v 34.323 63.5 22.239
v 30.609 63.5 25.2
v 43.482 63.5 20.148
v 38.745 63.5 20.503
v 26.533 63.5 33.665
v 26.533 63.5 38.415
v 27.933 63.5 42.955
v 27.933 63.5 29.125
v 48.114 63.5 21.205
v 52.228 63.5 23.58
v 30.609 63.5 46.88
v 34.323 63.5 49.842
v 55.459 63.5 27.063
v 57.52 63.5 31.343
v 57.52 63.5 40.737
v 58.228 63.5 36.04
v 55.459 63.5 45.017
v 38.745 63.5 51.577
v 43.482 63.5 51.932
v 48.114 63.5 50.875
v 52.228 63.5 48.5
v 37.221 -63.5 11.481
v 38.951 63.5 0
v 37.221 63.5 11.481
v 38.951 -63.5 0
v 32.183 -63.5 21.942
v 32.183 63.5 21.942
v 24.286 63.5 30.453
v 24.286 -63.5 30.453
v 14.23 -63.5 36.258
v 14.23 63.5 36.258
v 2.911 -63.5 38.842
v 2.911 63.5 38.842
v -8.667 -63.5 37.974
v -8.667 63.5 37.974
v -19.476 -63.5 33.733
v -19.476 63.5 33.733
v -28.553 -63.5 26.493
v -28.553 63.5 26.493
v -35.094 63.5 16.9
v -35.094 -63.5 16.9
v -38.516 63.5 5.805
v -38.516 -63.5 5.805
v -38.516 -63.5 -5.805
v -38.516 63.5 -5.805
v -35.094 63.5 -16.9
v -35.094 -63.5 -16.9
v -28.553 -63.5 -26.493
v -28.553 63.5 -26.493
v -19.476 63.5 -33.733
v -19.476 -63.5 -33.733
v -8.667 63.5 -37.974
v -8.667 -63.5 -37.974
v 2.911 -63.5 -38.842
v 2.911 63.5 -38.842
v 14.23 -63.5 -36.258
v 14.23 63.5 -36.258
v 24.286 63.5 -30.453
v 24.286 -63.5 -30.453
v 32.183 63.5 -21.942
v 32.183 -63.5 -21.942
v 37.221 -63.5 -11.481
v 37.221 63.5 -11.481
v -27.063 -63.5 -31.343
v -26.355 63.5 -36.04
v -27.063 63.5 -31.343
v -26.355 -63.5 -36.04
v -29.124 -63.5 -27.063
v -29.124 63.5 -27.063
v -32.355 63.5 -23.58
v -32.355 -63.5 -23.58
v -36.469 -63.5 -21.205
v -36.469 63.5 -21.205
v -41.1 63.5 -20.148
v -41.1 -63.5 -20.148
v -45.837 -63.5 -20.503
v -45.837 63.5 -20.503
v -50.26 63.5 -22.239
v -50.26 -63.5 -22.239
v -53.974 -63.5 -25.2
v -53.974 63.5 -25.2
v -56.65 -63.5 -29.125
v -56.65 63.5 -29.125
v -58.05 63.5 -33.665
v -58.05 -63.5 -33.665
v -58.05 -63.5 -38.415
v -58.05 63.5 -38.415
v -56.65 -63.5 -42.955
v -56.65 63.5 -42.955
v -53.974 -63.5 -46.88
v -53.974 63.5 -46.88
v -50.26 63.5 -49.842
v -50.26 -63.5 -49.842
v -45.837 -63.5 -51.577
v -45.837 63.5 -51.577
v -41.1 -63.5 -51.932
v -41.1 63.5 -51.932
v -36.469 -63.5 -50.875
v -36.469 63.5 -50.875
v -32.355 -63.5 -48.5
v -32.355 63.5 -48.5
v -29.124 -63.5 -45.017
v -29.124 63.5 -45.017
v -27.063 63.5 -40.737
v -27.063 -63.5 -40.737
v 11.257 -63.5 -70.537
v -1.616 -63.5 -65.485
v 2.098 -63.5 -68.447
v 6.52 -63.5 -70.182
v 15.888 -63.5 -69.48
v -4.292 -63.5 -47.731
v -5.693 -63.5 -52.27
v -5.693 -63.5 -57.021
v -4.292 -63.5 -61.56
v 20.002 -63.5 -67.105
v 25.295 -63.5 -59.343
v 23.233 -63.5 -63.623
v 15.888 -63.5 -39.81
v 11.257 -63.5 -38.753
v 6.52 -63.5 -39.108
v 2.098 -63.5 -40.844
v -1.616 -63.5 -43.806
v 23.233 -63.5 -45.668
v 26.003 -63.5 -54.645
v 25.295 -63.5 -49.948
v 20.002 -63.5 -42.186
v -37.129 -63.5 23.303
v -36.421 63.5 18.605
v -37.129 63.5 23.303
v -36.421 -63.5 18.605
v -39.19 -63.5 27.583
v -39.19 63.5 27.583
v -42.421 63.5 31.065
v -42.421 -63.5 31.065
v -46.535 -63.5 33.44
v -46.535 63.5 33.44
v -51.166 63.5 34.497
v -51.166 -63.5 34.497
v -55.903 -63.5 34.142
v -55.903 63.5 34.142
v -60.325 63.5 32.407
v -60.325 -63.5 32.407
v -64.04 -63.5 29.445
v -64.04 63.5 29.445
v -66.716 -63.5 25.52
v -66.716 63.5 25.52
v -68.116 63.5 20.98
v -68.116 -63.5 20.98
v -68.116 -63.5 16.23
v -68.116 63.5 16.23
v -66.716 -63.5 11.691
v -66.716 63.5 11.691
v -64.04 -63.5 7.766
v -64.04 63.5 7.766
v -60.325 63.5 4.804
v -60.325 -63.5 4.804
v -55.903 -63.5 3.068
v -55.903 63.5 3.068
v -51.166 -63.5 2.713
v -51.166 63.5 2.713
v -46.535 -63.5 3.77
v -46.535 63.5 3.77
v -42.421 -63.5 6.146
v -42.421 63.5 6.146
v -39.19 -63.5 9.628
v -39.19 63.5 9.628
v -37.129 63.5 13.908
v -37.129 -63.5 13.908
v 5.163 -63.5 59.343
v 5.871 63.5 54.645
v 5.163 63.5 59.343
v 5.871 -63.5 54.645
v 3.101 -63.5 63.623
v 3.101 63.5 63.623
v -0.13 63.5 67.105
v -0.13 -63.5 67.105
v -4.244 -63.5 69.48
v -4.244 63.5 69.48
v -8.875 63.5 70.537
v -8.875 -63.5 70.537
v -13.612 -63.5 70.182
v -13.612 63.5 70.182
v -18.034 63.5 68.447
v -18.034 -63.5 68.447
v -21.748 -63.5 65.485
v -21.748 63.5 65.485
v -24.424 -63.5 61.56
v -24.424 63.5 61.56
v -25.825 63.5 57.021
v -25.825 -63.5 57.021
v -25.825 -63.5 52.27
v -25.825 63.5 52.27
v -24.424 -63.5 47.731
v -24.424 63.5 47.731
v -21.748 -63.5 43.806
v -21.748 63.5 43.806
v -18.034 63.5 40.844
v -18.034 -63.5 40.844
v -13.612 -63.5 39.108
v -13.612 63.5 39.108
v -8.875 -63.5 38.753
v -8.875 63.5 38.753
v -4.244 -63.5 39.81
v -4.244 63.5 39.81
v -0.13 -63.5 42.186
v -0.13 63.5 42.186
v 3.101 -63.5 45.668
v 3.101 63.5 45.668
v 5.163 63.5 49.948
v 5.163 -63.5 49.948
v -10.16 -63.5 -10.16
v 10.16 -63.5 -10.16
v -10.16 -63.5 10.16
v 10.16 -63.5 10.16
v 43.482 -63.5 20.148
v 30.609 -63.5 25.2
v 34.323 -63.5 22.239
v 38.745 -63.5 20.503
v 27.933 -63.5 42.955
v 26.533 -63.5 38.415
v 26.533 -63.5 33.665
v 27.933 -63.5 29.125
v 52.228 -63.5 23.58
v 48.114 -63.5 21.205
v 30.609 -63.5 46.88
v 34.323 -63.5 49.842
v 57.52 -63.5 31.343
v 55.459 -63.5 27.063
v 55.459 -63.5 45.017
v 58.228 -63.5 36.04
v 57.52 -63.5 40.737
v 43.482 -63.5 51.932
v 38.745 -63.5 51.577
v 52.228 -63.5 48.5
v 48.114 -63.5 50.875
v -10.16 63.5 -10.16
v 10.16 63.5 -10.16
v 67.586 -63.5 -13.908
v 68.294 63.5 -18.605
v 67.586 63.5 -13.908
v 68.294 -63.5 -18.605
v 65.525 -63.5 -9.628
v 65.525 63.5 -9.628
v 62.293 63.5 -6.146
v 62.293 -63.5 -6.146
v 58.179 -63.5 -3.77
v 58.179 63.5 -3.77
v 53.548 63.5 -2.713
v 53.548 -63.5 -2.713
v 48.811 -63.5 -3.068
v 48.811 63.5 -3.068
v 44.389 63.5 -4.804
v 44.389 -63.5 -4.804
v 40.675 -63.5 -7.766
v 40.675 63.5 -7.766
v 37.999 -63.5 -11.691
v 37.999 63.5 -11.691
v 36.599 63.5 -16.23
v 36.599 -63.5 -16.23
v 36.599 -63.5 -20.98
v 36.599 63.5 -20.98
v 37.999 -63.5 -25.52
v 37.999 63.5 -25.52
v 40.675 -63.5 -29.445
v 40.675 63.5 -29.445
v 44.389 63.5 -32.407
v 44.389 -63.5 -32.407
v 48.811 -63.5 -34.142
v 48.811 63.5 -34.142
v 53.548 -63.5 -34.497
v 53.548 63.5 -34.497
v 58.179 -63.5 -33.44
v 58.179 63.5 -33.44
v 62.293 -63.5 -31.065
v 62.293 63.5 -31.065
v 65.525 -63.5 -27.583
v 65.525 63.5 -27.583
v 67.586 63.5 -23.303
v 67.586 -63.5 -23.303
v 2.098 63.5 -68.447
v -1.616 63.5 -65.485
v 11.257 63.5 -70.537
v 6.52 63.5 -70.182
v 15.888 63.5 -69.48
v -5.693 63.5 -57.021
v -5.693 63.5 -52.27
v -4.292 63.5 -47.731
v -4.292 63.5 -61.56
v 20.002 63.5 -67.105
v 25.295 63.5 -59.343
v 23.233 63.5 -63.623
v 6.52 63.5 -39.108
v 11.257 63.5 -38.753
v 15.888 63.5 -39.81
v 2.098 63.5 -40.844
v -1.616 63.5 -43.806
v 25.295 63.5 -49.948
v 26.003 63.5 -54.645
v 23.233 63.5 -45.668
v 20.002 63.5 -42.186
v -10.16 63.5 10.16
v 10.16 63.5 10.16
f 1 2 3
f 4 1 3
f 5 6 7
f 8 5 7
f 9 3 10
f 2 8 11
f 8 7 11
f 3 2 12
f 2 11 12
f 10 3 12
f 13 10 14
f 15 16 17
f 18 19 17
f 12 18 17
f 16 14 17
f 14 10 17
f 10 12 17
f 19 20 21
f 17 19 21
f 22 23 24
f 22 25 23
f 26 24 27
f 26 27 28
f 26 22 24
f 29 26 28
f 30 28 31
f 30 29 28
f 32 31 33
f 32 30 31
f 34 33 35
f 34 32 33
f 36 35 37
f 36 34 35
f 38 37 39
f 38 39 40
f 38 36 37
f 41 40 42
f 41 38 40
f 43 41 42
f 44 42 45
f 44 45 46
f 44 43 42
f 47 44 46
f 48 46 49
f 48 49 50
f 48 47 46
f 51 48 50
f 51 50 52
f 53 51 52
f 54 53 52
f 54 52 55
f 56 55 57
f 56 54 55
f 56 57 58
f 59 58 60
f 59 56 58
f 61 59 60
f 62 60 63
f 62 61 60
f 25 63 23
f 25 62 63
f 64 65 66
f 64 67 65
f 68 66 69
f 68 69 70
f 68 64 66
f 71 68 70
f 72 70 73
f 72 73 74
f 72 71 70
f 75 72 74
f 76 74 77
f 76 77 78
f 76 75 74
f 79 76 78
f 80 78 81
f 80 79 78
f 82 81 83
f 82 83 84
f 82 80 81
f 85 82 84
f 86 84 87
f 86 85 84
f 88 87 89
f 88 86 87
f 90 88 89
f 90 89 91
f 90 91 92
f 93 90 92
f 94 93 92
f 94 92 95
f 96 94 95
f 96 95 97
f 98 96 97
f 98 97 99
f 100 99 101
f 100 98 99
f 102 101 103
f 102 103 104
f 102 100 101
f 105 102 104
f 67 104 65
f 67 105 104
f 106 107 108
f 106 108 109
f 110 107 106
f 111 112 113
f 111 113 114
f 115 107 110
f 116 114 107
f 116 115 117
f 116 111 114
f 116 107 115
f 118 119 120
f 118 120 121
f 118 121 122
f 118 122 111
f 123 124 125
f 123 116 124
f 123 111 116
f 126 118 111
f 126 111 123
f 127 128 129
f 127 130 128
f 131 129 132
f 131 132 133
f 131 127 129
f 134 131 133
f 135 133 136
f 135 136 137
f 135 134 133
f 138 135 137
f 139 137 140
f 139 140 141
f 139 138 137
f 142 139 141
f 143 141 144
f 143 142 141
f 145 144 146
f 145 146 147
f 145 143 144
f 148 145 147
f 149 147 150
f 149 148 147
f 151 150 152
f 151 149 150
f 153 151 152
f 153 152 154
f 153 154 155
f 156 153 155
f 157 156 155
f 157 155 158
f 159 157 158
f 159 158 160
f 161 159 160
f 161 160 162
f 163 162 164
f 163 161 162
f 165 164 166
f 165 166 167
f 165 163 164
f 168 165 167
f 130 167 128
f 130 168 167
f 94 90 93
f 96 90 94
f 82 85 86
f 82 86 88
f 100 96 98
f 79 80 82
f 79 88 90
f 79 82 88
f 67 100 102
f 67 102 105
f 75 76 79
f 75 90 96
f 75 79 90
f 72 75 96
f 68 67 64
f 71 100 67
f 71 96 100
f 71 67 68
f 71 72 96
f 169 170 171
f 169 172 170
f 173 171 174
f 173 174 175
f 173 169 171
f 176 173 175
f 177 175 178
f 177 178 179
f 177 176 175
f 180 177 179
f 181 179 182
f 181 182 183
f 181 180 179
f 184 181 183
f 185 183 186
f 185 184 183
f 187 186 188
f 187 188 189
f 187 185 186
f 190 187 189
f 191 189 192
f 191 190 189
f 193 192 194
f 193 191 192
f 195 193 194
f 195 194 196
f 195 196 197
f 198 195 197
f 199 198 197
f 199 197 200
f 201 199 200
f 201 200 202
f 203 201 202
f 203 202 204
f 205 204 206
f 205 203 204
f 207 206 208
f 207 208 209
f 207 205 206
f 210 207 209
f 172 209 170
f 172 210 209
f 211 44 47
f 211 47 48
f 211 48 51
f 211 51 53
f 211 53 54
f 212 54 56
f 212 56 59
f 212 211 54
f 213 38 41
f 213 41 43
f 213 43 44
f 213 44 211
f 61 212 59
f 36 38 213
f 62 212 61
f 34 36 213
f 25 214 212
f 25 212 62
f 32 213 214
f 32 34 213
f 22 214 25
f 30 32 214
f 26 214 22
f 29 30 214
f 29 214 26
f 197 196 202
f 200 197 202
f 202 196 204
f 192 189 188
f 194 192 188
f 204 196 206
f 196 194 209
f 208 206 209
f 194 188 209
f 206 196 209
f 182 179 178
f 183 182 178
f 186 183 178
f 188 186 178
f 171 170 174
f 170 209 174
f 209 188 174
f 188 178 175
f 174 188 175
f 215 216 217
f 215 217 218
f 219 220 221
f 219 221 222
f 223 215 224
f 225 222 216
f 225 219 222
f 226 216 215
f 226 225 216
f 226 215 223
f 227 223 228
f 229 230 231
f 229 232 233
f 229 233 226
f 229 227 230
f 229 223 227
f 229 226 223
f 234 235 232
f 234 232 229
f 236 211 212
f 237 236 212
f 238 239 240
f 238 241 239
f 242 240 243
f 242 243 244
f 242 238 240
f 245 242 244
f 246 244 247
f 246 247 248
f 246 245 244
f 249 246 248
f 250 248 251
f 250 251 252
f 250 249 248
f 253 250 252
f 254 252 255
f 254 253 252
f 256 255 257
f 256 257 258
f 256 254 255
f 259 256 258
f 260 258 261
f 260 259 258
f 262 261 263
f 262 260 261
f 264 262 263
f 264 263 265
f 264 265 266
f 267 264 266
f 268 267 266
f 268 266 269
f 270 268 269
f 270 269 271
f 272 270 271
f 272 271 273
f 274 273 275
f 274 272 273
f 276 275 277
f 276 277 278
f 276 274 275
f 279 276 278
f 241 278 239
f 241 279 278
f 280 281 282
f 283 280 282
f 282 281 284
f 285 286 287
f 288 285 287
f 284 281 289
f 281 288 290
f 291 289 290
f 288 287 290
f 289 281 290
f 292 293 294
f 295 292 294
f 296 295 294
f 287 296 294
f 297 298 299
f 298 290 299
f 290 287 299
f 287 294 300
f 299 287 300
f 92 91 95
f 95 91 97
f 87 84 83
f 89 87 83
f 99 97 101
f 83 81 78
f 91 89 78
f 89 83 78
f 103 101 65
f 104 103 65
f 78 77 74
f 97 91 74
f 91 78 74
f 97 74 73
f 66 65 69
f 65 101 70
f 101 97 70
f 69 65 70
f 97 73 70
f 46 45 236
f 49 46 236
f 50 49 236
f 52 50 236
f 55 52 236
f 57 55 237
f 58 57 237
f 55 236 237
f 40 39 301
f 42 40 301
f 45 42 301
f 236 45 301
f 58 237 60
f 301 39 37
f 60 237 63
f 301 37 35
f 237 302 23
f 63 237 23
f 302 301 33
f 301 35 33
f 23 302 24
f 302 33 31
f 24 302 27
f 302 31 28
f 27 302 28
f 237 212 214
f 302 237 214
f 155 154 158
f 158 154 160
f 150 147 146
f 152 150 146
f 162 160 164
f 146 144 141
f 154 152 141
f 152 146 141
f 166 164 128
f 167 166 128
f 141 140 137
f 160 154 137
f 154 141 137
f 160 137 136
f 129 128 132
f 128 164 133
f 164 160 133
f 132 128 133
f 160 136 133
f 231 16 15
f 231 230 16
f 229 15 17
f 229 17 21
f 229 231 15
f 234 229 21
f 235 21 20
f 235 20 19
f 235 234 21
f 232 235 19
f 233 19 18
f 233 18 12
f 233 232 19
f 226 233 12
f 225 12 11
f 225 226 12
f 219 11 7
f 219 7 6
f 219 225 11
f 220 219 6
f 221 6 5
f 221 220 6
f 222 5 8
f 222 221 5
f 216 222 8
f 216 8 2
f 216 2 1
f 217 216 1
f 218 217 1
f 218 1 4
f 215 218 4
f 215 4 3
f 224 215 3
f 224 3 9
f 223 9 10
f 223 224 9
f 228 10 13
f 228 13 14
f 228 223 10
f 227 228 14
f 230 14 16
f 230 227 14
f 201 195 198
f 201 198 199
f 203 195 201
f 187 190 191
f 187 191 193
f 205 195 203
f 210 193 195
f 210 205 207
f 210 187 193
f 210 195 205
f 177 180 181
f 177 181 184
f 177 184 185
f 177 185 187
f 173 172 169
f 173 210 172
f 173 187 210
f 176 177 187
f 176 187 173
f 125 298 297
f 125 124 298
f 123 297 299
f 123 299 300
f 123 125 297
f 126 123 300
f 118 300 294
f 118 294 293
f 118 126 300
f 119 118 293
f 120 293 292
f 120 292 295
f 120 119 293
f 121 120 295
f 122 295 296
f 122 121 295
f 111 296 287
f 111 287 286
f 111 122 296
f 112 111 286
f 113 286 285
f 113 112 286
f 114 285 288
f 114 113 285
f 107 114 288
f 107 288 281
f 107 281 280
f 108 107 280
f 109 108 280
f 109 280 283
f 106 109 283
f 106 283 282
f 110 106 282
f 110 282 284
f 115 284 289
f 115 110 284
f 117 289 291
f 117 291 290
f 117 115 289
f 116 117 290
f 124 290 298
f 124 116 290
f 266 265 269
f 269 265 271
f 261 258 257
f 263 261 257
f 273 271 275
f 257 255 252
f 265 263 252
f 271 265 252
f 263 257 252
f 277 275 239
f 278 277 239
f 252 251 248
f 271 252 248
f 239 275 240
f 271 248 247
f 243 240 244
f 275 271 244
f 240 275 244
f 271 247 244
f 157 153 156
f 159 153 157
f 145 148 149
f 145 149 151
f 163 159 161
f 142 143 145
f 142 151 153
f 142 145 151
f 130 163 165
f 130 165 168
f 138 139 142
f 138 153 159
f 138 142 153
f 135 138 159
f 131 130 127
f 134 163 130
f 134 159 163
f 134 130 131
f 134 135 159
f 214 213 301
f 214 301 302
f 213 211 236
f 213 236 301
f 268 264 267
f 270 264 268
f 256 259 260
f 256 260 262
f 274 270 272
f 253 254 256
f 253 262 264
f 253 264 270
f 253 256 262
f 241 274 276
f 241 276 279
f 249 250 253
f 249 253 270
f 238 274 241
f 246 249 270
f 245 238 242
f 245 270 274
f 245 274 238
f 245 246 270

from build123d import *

# Parameters (mm, degrees)
F0_R     = 15.936550819
F1_DEPTH = 63.5
F0_R_2   = 38.9510369052
F0_R_3   = 26.7223642195
F5_DEPTH = 25.4
F8_W     = 20.32
F8_H     = 20.32
F9_DEPTH = 127.001


# Not quite as in the source:
# - the program builds the solid bodies; features that only make, move or delete a surface that nothing else refers to are left out


with BuildPart() as f1:
    # F0 (on Front) → F1 (new body, symmetric)
    with BuildSketch(Plane.XZ):
        with Locations((42.2912457866, 36.0400506581)):
            Circle(F0_R)
    extrude(amount=F1_DEPTH, both=True)

    # F4 (on face) → F5 (cut)
    with BuildSketch(Plane(origin=(23.2564192551, 0, 0), x_dir=(0, -1, 0), z_dir=(-1, 0, 0))):
        Polygon((-131.7048221827, 0), (-70.3143179417, 0), (-70.3143179417, 7.7529181726), (-170.3111678362, 7.7529181726), (-170.3111678362, 0), align=None)
        Polygon((-70.3143179417, -7.7529181726), (-70.3143179417, 0), (-131.7048221827, 0), (-170.3111678362, 0), (-170.3111678362, -7.7529181726), align=None)
    extrude(amount=-F5_DEPTH, mode=Mode.SUBTRACT)


with BuildPart() as f1b:
    # F0 (on Front) → F1, piece 2 (new body, symmetric)
    with BuildSketch(Plane.XZ):
        Circle(F0_R_2)
        Circle(F0_R_3, mode=Mode.SUBTRACT)
        Circle(F0_R_3)
    extrude(amount=F1_DEPTH, both=True)

    # F8 (on face) → F9 (cut, through all)
    with BuildSketch(Plane.XZ.offset(63.5)):
        Rectangle(F8_W, F8_H)
    extrude(amount=-F9_DEPTH, mode=Mode.SUBTRACT)


with BuildPart() as f1c:
    # F0 (on Front) → F1, piece 3 (new body, symmetric)
    with BuildSketch(Plane.XZ):
        with Locations((-10.0659765303, 54.645318538)):
            Circle(F0_R)
    extrude(amount=F1_DEPTH, both=True)


with BuildPart() as f1d:
    # F0 (on Front) → F1, piece 4 (new body, symmetric)
    with BuildSketch(Plane.XZ):
        with Locations((-52.3572223169, 18.6052678798)):
            Circle(F0_R)
    extrude(amount=F1_DEPTH, both=True)


with BuildPart() as f1e:
    # F0 (on Front) → F1, piece 5 (new body, symmetric)
    with BuildSketch(Plane.XZ):
        with Locations((-42.2912457866, -36.0400506581)):
            Circle(F0_R)
    extrude(amount=F1_DEPTH, both=True)


with BuildPart() as f1f:
    # F0 (on Front) → F1, piece 6 (new body, symmetric)
    with BuildSketch(Plane.XZ):
        with Locations((10.0659765303, -54.645318538)):
            Circle(F0_R)
    extrude(amount=F1_DEPTH, both=True)


with BuildPart() as f1g:
    # F0 (on Front) → F1, piece 7 (new body, symmetric)
    with BuildSketch(Plane.XZ):
        with Locations((52.3572223169, -18.6052678798)):
            Circle(F0_R)
    extrude(amount=F1_DEPTH, both=True)


solid = Compound([f1.part, f1b.part, f1c.part, f1d.part, f1e.part, f1f.part, f1g.part])
